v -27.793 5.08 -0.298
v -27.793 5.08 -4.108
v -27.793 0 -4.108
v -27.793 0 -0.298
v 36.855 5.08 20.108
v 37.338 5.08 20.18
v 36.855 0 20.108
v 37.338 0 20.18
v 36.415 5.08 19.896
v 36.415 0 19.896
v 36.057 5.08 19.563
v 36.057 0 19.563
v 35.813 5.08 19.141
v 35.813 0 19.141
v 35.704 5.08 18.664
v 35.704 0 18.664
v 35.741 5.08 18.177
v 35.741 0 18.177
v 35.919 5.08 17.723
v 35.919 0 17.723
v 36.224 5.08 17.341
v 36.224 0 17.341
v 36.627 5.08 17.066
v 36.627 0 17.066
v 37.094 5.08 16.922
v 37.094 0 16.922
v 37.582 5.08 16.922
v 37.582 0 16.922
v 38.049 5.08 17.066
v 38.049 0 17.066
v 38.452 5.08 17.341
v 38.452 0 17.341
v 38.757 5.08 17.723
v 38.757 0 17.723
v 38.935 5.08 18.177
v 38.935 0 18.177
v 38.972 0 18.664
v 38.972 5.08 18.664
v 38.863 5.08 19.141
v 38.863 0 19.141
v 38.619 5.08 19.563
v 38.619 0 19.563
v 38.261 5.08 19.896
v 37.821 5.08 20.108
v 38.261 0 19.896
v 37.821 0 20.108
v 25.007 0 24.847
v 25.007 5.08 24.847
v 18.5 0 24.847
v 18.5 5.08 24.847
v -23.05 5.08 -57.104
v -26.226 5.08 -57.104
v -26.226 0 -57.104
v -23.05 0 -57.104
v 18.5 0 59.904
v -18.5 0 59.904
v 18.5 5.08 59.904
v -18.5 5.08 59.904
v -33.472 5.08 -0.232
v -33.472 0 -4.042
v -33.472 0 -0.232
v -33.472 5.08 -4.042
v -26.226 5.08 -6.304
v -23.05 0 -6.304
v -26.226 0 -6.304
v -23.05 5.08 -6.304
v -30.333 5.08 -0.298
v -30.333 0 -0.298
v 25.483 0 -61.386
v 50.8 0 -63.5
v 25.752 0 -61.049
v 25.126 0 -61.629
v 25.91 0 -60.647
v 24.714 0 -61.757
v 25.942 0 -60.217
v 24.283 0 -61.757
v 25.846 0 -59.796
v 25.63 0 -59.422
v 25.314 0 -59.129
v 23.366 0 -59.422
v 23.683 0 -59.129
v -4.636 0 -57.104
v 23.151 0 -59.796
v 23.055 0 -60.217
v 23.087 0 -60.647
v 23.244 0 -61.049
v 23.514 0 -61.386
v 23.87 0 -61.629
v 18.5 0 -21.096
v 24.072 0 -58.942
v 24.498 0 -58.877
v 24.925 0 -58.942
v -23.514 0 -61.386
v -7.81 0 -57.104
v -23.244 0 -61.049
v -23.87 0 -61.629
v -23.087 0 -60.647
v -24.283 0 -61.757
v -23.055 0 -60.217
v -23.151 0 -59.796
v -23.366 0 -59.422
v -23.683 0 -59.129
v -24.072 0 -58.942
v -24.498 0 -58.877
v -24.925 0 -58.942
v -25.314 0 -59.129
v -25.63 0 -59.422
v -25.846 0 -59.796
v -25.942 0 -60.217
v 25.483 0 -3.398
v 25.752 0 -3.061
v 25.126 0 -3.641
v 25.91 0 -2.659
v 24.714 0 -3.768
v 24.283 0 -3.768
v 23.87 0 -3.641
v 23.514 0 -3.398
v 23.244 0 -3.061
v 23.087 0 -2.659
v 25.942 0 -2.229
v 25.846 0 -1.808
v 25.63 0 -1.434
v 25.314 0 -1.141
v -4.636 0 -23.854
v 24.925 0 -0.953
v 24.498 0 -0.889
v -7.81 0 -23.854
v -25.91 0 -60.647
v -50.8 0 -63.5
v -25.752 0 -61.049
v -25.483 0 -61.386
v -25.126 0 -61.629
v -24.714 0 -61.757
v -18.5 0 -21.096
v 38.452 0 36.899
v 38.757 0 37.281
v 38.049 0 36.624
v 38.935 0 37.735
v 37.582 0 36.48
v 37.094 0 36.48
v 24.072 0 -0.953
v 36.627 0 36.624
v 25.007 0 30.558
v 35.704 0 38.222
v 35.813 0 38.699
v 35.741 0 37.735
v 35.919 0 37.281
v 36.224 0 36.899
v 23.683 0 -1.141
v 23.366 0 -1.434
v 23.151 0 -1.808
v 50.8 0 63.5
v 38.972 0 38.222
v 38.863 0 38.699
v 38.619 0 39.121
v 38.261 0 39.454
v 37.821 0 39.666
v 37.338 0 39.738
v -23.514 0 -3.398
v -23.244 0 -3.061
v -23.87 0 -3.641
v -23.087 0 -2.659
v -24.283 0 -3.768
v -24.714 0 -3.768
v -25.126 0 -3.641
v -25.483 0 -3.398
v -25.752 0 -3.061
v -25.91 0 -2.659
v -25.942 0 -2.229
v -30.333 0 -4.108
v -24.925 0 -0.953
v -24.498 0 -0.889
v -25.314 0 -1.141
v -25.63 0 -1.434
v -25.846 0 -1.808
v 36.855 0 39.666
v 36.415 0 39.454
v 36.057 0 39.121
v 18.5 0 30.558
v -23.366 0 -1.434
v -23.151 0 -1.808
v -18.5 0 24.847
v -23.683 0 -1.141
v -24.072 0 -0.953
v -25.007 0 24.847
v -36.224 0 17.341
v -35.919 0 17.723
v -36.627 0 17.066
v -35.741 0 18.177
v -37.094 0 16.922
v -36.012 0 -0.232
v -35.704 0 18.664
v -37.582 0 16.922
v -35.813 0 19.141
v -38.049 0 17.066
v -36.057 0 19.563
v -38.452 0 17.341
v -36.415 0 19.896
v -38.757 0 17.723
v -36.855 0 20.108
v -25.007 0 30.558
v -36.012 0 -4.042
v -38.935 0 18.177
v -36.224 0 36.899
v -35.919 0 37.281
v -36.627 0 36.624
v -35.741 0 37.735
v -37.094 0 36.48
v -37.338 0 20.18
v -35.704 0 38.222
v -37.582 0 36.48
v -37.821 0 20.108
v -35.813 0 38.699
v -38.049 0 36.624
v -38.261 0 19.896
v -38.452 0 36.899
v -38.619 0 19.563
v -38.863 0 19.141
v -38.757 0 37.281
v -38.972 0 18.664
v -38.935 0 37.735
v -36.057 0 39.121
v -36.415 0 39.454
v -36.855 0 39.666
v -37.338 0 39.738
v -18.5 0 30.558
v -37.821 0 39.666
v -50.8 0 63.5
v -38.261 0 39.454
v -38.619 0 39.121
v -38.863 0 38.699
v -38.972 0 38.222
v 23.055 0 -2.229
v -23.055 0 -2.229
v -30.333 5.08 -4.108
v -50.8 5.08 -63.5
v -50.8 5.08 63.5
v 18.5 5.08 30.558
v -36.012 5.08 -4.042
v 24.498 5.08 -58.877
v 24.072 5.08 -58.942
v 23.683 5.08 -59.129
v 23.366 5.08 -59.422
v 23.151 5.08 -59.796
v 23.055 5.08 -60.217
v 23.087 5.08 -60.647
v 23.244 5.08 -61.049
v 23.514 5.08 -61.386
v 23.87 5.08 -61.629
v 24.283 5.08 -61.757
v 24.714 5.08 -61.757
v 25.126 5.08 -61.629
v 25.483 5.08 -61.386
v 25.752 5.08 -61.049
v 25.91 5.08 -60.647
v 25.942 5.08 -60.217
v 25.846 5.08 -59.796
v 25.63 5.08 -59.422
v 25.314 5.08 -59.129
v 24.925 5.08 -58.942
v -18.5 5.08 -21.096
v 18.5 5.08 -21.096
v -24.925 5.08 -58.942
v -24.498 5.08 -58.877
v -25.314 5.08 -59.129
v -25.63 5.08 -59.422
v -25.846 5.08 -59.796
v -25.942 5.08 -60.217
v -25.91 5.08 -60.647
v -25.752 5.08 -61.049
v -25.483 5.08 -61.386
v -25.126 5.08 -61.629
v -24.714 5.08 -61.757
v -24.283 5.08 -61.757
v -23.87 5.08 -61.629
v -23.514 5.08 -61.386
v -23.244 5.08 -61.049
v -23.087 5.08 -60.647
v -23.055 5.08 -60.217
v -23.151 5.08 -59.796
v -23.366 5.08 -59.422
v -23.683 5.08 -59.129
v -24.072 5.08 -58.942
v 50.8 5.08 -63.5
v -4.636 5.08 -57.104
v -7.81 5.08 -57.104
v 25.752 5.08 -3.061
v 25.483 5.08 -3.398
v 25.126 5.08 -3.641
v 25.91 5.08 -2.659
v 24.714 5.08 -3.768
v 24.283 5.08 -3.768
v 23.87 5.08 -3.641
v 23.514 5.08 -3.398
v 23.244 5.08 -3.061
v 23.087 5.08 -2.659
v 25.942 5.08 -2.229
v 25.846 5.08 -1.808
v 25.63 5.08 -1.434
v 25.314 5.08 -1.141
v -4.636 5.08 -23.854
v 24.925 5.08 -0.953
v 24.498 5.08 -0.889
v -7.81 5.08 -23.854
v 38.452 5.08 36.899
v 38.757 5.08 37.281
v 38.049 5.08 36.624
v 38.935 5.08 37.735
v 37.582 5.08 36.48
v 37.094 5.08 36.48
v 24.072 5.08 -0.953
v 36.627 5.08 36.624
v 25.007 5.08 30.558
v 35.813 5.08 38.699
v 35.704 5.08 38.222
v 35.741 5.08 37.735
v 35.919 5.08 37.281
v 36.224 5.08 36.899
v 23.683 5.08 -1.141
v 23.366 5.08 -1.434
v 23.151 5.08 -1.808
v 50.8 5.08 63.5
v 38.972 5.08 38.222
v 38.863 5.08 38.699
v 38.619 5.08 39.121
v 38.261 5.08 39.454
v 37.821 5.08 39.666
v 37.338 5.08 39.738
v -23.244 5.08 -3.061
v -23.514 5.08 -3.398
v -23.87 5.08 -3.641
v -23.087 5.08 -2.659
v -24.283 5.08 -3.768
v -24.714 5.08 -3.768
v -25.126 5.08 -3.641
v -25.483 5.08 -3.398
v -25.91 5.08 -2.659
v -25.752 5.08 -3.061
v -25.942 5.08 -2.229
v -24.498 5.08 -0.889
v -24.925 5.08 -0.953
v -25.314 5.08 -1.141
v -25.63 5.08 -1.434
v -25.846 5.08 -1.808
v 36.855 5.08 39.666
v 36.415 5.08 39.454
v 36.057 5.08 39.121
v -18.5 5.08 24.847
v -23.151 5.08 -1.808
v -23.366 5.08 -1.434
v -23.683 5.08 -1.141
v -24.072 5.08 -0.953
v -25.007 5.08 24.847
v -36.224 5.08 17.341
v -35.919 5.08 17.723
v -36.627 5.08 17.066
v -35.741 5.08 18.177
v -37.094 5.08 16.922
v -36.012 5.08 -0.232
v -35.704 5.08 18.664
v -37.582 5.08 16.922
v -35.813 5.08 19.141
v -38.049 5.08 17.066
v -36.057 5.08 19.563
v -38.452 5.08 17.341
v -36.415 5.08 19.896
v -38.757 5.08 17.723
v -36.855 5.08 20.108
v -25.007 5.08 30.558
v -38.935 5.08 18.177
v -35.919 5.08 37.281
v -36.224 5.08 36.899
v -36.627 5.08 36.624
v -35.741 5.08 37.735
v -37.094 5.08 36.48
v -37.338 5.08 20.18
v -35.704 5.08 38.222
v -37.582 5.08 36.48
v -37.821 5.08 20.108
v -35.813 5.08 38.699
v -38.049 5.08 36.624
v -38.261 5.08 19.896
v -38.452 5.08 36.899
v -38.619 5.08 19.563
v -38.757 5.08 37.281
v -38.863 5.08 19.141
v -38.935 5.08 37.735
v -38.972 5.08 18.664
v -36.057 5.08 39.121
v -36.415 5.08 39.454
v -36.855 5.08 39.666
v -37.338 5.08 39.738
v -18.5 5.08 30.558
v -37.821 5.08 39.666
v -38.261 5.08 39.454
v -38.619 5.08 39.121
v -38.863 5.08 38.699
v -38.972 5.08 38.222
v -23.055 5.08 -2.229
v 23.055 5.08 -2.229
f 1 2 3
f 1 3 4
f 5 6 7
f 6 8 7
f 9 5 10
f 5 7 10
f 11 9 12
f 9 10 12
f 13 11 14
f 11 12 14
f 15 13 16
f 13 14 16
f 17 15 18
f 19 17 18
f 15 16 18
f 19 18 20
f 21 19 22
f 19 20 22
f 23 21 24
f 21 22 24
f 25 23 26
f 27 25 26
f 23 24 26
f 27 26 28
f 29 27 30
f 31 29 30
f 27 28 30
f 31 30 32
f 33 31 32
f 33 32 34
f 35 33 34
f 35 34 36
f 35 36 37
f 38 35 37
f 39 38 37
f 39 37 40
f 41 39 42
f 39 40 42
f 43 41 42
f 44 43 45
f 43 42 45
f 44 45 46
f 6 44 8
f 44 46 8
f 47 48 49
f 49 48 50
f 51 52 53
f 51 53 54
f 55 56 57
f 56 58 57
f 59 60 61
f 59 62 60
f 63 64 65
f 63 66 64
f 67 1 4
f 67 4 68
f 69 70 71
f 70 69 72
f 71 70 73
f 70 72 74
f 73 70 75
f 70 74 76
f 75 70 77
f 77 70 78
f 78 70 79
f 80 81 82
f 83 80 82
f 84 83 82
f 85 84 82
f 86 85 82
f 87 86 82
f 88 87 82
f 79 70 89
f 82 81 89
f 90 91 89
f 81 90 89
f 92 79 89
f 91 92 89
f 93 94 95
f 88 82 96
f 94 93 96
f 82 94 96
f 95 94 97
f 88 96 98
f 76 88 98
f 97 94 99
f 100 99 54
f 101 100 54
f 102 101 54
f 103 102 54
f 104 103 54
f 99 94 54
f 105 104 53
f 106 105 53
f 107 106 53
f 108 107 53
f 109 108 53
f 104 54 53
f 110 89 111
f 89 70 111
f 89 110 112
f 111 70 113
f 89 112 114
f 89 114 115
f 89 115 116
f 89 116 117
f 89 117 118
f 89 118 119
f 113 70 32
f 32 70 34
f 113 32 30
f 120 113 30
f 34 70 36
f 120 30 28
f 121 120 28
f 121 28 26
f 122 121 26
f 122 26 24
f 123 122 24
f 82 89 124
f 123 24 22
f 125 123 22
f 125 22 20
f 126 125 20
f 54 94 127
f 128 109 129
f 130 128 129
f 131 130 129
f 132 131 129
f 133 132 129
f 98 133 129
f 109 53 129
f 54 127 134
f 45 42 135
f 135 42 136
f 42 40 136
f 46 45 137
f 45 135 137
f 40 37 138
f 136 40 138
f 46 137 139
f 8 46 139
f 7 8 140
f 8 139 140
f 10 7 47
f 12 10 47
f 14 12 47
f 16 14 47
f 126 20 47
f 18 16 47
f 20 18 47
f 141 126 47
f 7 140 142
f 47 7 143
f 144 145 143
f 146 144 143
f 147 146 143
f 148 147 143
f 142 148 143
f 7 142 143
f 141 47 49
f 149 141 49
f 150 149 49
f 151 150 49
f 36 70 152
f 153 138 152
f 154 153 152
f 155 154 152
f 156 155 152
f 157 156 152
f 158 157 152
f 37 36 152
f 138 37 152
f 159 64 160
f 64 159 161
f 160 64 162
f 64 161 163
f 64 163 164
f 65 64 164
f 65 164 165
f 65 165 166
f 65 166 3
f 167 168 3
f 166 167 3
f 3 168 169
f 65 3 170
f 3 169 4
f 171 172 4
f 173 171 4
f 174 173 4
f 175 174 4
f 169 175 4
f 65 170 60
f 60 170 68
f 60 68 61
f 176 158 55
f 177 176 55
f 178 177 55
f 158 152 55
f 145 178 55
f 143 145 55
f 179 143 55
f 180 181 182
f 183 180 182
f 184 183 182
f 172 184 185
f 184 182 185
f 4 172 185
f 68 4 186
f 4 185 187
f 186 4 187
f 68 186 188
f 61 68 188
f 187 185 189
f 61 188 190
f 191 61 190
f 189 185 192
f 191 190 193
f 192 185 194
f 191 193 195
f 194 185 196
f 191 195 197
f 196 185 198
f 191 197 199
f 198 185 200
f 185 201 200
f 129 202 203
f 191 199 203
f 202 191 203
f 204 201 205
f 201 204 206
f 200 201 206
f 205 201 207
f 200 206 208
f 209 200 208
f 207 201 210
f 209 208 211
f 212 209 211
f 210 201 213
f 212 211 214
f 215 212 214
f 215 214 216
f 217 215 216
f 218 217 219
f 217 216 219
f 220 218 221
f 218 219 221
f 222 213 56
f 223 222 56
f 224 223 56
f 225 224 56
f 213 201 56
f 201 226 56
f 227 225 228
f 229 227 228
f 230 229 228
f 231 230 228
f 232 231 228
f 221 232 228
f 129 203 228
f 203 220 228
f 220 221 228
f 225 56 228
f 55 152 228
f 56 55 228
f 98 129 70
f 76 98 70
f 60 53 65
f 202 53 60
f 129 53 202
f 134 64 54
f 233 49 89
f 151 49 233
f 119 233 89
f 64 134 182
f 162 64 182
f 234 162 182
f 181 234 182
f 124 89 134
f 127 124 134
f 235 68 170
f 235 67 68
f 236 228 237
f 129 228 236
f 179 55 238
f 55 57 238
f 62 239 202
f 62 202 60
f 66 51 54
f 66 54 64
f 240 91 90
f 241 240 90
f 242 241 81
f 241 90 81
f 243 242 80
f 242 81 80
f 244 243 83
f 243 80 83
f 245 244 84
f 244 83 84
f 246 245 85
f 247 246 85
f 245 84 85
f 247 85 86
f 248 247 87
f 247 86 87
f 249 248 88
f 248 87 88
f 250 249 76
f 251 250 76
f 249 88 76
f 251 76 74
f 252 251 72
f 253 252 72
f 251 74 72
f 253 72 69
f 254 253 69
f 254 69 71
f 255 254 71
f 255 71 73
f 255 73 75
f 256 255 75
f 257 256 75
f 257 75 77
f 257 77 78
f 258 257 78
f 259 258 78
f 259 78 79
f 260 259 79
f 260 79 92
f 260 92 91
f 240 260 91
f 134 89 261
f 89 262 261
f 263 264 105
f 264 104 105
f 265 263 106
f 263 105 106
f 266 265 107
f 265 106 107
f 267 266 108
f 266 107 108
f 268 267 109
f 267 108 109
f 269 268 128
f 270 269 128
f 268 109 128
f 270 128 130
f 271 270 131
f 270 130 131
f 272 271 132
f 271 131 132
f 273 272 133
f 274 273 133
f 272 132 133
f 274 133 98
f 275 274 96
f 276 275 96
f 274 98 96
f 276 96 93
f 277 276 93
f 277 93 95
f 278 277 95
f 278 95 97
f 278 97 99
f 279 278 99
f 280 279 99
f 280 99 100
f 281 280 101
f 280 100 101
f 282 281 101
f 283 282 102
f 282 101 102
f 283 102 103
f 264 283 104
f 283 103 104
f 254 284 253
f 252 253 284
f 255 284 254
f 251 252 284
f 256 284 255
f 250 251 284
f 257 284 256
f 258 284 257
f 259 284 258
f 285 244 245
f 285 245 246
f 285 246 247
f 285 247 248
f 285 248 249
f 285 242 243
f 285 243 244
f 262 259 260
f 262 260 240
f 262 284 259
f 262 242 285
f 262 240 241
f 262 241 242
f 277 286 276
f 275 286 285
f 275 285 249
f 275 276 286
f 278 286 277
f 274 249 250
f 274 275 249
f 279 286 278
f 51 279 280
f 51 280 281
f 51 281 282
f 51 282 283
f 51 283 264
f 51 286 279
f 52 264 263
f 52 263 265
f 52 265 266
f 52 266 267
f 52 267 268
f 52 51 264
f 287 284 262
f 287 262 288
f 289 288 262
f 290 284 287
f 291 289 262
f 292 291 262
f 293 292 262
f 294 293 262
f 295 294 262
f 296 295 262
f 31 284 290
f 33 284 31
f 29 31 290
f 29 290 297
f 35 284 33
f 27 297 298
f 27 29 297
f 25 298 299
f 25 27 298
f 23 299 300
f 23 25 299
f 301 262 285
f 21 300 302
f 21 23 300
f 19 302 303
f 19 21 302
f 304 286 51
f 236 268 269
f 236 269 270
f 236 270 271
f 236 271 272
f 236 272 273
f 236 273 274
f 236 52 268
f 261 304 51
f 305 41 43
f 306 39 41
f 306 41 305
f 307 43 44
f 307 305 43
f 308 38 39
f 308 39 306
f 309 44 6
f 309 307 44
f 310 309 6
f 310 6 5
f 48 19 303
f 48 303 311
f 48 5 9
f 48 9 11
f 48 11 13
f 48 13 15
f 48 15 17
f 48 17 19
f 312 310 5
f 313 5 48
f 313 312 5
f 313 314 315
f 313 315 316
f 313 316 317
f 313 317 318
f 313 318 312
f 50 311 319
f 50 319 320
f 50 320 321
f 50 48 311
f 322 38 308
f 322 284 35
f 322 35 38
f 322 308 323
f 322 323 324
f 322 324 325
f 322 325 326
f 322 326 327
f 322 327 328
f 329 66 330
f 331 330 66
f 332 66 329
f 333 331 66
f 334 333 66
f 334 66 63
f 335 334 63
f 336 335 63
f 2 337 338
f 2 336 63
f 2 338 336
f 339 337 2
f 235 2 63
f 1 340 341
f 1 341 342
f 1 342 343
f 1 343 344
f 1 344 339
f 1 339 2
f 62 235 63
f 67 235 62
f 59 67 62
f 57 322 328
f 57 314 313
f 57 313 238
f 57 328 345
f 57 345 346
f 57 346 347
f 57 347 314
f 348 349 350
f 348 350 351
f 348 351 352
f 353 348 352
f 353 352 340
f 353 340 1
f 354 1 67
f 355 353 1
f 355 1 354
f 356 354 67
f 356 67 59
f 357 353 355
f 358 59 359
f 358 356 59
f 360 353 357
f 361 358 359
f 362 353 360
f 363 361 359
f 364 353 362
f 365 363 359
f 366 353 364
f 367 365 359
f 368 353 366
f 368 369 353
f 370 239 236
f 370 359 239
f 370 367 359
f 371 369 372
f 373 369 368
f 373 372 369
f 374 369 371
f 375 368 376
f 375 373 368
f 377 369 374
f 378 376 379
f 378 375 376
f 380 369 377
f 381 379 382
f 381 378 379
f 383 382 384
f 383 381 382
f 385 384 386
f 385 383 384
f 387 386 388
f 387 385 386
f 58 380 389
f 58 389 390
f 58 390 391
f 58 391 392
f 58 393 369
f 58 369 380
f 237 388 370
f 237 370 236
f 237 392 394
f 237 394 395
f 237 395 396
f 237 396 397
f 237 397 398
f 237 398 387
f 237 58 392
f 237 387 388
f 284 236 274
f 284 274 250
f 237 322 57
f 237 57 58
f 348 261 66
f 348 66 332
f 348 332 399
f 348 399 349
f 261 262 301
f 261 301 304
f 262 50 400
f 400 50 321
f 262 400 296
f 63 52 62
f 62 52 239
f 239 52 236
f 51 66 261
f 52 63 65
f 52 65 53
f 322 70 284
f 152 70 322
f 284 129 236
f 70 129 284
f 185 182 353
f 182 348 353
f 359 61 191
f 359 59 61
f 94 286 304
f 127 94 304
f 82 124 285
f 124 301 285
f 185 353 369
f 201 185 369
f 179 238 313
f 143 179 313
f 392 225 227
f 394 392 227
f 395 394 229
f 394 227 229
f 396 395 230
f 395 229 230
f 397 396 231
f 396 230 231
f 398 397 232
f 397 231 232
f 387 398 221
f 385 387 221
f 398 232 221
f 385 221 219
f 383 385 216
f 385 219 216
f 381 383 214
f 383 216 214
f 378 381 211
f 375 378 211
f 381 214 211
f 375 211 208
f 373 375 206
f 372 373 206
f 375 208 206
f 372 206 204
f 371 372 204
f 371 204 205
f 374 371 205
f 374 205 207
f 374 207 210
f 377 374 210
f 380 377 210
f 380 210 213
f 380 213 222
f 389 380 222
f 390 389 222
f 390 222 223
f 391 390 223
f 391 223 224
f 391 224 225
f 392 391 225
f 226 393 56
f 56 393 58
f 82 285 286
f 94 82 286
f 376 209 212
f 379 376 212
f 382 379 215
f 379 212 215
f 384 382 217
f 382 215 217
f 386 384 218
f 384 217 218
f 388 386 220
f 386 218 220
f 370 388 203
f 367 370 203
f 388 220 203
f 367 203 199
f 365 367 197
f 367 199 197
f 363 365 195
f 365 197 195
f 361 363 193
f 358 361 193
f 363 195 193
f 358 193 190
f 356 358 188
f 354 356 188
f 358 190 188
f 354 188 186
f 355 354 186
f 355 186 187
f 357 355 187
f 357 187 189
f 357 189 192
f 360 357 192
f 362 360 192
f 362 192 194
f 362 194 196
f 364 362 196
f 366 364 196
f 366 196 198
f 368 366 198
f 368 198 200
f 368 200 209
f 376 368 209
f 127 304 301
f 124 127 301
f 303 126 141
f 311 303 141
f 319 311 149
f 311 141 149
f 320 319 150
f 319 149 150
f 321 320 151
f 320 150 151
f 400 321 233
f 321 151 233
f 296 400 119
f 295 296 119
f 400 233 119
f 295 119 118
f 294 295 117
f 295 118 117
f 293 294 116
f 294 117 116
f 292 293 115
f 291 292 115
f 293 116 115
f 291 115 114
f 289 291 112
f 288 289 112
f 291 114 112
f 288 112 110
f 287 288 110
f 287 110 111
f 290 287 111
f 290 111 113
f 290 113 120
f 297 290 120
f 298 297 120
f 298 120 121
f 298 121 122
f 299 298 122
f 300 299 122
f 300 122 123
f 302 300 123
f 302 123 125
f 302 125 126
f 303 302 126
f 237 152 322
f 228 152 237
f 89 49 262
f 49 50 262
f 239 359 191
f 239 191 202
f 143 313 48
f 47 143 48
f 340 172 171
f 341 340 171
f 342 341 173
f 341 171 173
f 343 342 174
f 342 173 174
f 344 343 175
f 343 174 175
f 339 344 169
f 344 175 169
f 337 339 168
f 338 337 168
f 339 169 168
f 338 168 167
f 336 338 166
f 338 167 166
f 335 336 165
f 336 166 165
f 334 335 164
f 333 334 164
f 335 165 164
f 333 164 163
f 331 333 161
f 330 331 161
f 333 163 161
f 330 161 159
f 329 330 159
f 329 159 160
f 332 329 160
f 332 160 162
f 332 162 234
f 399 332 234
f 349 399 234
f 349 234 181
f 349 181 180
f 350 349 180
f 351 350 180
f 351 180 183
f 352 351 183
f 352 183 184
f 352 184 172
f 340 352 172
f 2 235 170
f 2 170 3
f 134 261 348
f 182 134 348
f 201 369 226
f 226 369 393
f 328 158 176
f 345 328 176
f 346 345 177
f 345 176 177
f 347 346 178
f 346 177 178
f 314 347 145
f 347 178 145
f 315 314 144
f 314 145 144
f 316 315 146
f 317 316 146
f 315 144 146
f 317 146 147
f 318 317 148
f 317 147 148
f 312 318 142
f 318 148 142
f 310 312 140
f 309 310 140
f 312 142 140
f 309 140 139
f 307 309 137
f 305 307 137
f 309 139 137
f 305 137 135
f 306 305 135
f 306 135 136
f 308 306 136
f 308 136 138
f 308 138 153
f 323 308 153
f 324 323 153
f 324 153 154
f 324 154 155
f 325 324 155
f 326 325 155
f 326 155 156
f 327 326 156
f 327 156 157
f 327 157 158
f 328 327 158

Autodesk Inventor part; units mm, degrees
ref_plane "YZ Plane" through (0, 0, 0) normal (1, 0, 0) x (0, 1, 0)
ref_plane "XZ Plane" through (0, 0, 0) normal (0, 1, 0) x (-1, 0, 0)
ref_plane "XY Plane" through (0, 0, 0) normal (0, 0, 1) x (1, 0, 0)
sketch "Sketch1" plane through (0, 0, 0) normal (0, 1, 0) x (-1, 0, 0)
  line L0 (-50.8, 63.5) -> (50.8, 63.5)
  line L1 (50.8, 63.5) -> (50.8, -63.5)
  line L2 (50.8, -63.5) -> (-50.8, -63.5)
  line L3 (-50.8, -63.5) -> (-50.8, 63.5)
  line L4 (-50.8, 63.5) -> (50.8, -63.5) construction
  line L5 (50.8, 63.5) -> (-50.8, -63.5) construction
  point P0 (0, 0)
  point P1 (0, 0)
  dimension "d0" = 101.6
  dimension "d1" = 127
extrude "Plate1" add sketch "Sketch1" along normal blind 5.08
sketch "Sketch2" plane through (0, 5.08, 0) normal (0, 1, 0) x (1, 0, 0)
  line L0 (-50.8, 63.5) -> (50.8, 63.5) construction
  line L1 (0, 63.5) -> (0, -63.5) construction
  line L2 (50.8, -63.5) -> (-50.8, -63.5) construction
  line L3 (-50.8, -63.5) -> (-50.8, 63.5) construction
  point P0 (0, 0)
  point P1 (-37.338, -38.1)
  point P2 (-37.338, -18.542)
  point P3 (37.338, -38.1)
  point P4 (37.338, -18.542)
  dimension "d5" = 19.558
  dimension "d6" = 13.462
  dimension "d18" = 25.4
hole "MotorScrews" at (-37.338, 5.08, 38.1) at (-37.338, 5.08, 18.542) at (37.338, 5.08, 38.1) at (37.338, 5.08, 18.542) direction (0, -1, 0) diameter 3.2766 end through all clearance for "Flat Head Machine Screw (82)" size "#4" standard "Ansi Unified Screw Threads"
sketch "Sketch3" plane through (0, 5.08, 0) normal (0, 1, 0) x (1, 0, 0)
  line L0 (-18.5, -59.9042) -> (18.5, -59.9042)
  line L1 (18.5, -59.9042) -> (18.5, 21.0958)
  line L2 (18.5, 21.0958) -> (-18.5, 21.0958)
  line L3 (-18.5, 21.0958) -> (-18.5, -59.9042)
  line L4 (-18.5, -59.9042) -> (18.5, 21.0958) construction
  line L5 (18.5, -59.9042) -> (-18.5, 21.0958) construction
  point P0 (0, 0)
  point P1 (0, -19.4042)
  point P2 (0, -19.4042)
  dimension "d14" = 37
  dimension "d15" = 81
extrude "BatteryHole" cut sketch "Sketch3" against normal blind 5.08
sketch "Sketch4" plane through (0, 5.08, 0) normal (0, 1, 0) x (1, 0, 0)
  line L0 (18.5, -59.9042) -> (-18.5, -59.9042) projected
  line L1 (-25.0073, -30.5582) -> (25.0073, -30.5582)
  line L2 (25.0073, -30.5582) -> (25.0073, -24.8469)
  line L3 (25.0073, -24.8469) -> (-25.0073, -24.8469)
  line L4 (-25.0073, -24.8469) -> (-25.0073, -30.5582)
  line L5 (-25.0073, -30.5582) -> (25.0073, -24.8469) construction
  line L6 (25.0073, -30.5582) -> (-25.0073, -24.8469) construction
  point P0 (0, 0)
  point P1 (0, -27.7026)
  point P2 (0, -27.7026)
extrude "MotorWireHoles" cut sketch "Sketch4" against normal blind 5.08
sketch "Sketch5" plane through (0, 5.08, 0) normal (0, 1, 0) x (1, 0, 0)
  line L0 (0, 0) -> (0, 25.4) construction
  line L1 (-50.8, 63.5) -> (50.8, 63.5) projected
  point P0 (-24.4983, 2.3368)
  point P1 (24.4983, 2.3368)
  point P2 (-24.4983, 60.325)
  point P3 (24.4983, 60.325)
  dimension "d21" = 25.4
  dimension "d22" = 48.9966
  dimension "d23" = 57.9882
  dimension "d24" = 3.175
hole "PiScrews" at (-24.4983, 5.08, -2.3368) at (24.4983, 5.08, -2.3368) at (-24.4983, 5.08, -60.325) at (24.4983, 5.08, -60.325) direction (0, -1, 0) diameter 2.8956 end through all clearance for "Flat Head Machine Screw" size "M2.5" standard "Ansi Metric M Profile"
sketch "Sketch6" plane through (0, 5.08, 0) normal (0, 1, 0) x (1, 0, 0)
  line L0 (-15.4305, 17.2899) -> (-15.4305, 42.6899) construction
  line L1 (-26.2255, 57.1039) -> (-23.0505, 57.1039)
  line L2 (-23.0505, 57.1039) -> (-23.0505, 6.3039)
  line L3 (-23.0505, 6.3039) -> (-26.2255, 6.3039)
  line L4 (-26.2255, 6.3039) -> (-26.2255, 57.1039)
  circle A0 centre (-24.4983, 60.325) radius 1.4478 projected
  line L5 (-4.6355, 57.1039) -> (-7.8105, 57.1039)
  line L6 (-7.8105, 57.1039) -> (-7.8105, 23.8538)
  line L7 (-7.8105, 23.8538) -> (-4.6355, 23.8538)
  line L8 (-4.6355, 23.8538) -> (-4.6355, 57.1039)
  dimension "d33" = 3.175
  dimension "d34" = 50.8
  dimension "d37" = 15.24
extrude "WireHoles" cut sketch "Sketch6" against normal blind 5.08 contours L1 L2 L3 L4 | L8 L7 L6 L5
sketch "Sketch7" plane through (0, 5.08, 0) normal (0, 1, 0) x (1, 0, 0)
  line L0 (-36.0117, 4.0418) -> (-33.4717, 4.0418)
  line L1 (-33.4717, 4.0418) -> (-33.4717, 0.2318)
  line L2 (-33.4717, 0.2318) -> (-36.0117, 0.2318)
  line L3 (-36.0117, 0.2318) -> (-36.0117, 4.0418)
  line L4 (-30.3328, 4.1075) -> (-27.7928, 4.1075)
  line L5 (-27.7928, 4.1075) -> (-27.7928, 0.2975)
  line L6 (-27.7928, 0.2975) -> (-30.3328, 0.2975)
  line L7 (-30.3328, 0.2975) -> (-30.3328, 4.1075)
  point P0 (0, 0)
  dimension "d38" = 2.54
  dimension "d39" = 3.81
  dimension "d40" = 2.54
  dimension "d41" = 3.81
extrude "ZipTieHolder" cut sketch "Sketch7" against normal blind 5.08
equation "\"d18\" = motor_placement"
equation "\"d12\" = Thickness"
equation "\"d16\" = Thickness"
equation "\"d19\" = Thickness"
equation "\"d30\" = Thickness"
equation "\"d35\" = Thickness"
equation "\"d42\" = Thickness"
equation "\"d4\" = Thickness"
equation "\"BendRadius\" = Thickness"
equation "\"BendReliefWidth\" = Thickness"
equation "\"BendReliefDepth\" = 0.5 * Thickness"
equation "\"CornerReliefSize\" = 4 * Thickness"
equation "\"MinimumRemnant\" = 2 * Thickness"
equation "\"TransitionRadius\" = BendRadius"
equation "\"JacobiRadiusSize\" = BendRadius"
equation "\"GapSize\" = Thickness"
equation "\"Thickness\" = 5.08"
equation "\"motor_placement\" = 25.4"
properties part number "pibot_baseplate_battery" material "Polycarbonate, Clear"
